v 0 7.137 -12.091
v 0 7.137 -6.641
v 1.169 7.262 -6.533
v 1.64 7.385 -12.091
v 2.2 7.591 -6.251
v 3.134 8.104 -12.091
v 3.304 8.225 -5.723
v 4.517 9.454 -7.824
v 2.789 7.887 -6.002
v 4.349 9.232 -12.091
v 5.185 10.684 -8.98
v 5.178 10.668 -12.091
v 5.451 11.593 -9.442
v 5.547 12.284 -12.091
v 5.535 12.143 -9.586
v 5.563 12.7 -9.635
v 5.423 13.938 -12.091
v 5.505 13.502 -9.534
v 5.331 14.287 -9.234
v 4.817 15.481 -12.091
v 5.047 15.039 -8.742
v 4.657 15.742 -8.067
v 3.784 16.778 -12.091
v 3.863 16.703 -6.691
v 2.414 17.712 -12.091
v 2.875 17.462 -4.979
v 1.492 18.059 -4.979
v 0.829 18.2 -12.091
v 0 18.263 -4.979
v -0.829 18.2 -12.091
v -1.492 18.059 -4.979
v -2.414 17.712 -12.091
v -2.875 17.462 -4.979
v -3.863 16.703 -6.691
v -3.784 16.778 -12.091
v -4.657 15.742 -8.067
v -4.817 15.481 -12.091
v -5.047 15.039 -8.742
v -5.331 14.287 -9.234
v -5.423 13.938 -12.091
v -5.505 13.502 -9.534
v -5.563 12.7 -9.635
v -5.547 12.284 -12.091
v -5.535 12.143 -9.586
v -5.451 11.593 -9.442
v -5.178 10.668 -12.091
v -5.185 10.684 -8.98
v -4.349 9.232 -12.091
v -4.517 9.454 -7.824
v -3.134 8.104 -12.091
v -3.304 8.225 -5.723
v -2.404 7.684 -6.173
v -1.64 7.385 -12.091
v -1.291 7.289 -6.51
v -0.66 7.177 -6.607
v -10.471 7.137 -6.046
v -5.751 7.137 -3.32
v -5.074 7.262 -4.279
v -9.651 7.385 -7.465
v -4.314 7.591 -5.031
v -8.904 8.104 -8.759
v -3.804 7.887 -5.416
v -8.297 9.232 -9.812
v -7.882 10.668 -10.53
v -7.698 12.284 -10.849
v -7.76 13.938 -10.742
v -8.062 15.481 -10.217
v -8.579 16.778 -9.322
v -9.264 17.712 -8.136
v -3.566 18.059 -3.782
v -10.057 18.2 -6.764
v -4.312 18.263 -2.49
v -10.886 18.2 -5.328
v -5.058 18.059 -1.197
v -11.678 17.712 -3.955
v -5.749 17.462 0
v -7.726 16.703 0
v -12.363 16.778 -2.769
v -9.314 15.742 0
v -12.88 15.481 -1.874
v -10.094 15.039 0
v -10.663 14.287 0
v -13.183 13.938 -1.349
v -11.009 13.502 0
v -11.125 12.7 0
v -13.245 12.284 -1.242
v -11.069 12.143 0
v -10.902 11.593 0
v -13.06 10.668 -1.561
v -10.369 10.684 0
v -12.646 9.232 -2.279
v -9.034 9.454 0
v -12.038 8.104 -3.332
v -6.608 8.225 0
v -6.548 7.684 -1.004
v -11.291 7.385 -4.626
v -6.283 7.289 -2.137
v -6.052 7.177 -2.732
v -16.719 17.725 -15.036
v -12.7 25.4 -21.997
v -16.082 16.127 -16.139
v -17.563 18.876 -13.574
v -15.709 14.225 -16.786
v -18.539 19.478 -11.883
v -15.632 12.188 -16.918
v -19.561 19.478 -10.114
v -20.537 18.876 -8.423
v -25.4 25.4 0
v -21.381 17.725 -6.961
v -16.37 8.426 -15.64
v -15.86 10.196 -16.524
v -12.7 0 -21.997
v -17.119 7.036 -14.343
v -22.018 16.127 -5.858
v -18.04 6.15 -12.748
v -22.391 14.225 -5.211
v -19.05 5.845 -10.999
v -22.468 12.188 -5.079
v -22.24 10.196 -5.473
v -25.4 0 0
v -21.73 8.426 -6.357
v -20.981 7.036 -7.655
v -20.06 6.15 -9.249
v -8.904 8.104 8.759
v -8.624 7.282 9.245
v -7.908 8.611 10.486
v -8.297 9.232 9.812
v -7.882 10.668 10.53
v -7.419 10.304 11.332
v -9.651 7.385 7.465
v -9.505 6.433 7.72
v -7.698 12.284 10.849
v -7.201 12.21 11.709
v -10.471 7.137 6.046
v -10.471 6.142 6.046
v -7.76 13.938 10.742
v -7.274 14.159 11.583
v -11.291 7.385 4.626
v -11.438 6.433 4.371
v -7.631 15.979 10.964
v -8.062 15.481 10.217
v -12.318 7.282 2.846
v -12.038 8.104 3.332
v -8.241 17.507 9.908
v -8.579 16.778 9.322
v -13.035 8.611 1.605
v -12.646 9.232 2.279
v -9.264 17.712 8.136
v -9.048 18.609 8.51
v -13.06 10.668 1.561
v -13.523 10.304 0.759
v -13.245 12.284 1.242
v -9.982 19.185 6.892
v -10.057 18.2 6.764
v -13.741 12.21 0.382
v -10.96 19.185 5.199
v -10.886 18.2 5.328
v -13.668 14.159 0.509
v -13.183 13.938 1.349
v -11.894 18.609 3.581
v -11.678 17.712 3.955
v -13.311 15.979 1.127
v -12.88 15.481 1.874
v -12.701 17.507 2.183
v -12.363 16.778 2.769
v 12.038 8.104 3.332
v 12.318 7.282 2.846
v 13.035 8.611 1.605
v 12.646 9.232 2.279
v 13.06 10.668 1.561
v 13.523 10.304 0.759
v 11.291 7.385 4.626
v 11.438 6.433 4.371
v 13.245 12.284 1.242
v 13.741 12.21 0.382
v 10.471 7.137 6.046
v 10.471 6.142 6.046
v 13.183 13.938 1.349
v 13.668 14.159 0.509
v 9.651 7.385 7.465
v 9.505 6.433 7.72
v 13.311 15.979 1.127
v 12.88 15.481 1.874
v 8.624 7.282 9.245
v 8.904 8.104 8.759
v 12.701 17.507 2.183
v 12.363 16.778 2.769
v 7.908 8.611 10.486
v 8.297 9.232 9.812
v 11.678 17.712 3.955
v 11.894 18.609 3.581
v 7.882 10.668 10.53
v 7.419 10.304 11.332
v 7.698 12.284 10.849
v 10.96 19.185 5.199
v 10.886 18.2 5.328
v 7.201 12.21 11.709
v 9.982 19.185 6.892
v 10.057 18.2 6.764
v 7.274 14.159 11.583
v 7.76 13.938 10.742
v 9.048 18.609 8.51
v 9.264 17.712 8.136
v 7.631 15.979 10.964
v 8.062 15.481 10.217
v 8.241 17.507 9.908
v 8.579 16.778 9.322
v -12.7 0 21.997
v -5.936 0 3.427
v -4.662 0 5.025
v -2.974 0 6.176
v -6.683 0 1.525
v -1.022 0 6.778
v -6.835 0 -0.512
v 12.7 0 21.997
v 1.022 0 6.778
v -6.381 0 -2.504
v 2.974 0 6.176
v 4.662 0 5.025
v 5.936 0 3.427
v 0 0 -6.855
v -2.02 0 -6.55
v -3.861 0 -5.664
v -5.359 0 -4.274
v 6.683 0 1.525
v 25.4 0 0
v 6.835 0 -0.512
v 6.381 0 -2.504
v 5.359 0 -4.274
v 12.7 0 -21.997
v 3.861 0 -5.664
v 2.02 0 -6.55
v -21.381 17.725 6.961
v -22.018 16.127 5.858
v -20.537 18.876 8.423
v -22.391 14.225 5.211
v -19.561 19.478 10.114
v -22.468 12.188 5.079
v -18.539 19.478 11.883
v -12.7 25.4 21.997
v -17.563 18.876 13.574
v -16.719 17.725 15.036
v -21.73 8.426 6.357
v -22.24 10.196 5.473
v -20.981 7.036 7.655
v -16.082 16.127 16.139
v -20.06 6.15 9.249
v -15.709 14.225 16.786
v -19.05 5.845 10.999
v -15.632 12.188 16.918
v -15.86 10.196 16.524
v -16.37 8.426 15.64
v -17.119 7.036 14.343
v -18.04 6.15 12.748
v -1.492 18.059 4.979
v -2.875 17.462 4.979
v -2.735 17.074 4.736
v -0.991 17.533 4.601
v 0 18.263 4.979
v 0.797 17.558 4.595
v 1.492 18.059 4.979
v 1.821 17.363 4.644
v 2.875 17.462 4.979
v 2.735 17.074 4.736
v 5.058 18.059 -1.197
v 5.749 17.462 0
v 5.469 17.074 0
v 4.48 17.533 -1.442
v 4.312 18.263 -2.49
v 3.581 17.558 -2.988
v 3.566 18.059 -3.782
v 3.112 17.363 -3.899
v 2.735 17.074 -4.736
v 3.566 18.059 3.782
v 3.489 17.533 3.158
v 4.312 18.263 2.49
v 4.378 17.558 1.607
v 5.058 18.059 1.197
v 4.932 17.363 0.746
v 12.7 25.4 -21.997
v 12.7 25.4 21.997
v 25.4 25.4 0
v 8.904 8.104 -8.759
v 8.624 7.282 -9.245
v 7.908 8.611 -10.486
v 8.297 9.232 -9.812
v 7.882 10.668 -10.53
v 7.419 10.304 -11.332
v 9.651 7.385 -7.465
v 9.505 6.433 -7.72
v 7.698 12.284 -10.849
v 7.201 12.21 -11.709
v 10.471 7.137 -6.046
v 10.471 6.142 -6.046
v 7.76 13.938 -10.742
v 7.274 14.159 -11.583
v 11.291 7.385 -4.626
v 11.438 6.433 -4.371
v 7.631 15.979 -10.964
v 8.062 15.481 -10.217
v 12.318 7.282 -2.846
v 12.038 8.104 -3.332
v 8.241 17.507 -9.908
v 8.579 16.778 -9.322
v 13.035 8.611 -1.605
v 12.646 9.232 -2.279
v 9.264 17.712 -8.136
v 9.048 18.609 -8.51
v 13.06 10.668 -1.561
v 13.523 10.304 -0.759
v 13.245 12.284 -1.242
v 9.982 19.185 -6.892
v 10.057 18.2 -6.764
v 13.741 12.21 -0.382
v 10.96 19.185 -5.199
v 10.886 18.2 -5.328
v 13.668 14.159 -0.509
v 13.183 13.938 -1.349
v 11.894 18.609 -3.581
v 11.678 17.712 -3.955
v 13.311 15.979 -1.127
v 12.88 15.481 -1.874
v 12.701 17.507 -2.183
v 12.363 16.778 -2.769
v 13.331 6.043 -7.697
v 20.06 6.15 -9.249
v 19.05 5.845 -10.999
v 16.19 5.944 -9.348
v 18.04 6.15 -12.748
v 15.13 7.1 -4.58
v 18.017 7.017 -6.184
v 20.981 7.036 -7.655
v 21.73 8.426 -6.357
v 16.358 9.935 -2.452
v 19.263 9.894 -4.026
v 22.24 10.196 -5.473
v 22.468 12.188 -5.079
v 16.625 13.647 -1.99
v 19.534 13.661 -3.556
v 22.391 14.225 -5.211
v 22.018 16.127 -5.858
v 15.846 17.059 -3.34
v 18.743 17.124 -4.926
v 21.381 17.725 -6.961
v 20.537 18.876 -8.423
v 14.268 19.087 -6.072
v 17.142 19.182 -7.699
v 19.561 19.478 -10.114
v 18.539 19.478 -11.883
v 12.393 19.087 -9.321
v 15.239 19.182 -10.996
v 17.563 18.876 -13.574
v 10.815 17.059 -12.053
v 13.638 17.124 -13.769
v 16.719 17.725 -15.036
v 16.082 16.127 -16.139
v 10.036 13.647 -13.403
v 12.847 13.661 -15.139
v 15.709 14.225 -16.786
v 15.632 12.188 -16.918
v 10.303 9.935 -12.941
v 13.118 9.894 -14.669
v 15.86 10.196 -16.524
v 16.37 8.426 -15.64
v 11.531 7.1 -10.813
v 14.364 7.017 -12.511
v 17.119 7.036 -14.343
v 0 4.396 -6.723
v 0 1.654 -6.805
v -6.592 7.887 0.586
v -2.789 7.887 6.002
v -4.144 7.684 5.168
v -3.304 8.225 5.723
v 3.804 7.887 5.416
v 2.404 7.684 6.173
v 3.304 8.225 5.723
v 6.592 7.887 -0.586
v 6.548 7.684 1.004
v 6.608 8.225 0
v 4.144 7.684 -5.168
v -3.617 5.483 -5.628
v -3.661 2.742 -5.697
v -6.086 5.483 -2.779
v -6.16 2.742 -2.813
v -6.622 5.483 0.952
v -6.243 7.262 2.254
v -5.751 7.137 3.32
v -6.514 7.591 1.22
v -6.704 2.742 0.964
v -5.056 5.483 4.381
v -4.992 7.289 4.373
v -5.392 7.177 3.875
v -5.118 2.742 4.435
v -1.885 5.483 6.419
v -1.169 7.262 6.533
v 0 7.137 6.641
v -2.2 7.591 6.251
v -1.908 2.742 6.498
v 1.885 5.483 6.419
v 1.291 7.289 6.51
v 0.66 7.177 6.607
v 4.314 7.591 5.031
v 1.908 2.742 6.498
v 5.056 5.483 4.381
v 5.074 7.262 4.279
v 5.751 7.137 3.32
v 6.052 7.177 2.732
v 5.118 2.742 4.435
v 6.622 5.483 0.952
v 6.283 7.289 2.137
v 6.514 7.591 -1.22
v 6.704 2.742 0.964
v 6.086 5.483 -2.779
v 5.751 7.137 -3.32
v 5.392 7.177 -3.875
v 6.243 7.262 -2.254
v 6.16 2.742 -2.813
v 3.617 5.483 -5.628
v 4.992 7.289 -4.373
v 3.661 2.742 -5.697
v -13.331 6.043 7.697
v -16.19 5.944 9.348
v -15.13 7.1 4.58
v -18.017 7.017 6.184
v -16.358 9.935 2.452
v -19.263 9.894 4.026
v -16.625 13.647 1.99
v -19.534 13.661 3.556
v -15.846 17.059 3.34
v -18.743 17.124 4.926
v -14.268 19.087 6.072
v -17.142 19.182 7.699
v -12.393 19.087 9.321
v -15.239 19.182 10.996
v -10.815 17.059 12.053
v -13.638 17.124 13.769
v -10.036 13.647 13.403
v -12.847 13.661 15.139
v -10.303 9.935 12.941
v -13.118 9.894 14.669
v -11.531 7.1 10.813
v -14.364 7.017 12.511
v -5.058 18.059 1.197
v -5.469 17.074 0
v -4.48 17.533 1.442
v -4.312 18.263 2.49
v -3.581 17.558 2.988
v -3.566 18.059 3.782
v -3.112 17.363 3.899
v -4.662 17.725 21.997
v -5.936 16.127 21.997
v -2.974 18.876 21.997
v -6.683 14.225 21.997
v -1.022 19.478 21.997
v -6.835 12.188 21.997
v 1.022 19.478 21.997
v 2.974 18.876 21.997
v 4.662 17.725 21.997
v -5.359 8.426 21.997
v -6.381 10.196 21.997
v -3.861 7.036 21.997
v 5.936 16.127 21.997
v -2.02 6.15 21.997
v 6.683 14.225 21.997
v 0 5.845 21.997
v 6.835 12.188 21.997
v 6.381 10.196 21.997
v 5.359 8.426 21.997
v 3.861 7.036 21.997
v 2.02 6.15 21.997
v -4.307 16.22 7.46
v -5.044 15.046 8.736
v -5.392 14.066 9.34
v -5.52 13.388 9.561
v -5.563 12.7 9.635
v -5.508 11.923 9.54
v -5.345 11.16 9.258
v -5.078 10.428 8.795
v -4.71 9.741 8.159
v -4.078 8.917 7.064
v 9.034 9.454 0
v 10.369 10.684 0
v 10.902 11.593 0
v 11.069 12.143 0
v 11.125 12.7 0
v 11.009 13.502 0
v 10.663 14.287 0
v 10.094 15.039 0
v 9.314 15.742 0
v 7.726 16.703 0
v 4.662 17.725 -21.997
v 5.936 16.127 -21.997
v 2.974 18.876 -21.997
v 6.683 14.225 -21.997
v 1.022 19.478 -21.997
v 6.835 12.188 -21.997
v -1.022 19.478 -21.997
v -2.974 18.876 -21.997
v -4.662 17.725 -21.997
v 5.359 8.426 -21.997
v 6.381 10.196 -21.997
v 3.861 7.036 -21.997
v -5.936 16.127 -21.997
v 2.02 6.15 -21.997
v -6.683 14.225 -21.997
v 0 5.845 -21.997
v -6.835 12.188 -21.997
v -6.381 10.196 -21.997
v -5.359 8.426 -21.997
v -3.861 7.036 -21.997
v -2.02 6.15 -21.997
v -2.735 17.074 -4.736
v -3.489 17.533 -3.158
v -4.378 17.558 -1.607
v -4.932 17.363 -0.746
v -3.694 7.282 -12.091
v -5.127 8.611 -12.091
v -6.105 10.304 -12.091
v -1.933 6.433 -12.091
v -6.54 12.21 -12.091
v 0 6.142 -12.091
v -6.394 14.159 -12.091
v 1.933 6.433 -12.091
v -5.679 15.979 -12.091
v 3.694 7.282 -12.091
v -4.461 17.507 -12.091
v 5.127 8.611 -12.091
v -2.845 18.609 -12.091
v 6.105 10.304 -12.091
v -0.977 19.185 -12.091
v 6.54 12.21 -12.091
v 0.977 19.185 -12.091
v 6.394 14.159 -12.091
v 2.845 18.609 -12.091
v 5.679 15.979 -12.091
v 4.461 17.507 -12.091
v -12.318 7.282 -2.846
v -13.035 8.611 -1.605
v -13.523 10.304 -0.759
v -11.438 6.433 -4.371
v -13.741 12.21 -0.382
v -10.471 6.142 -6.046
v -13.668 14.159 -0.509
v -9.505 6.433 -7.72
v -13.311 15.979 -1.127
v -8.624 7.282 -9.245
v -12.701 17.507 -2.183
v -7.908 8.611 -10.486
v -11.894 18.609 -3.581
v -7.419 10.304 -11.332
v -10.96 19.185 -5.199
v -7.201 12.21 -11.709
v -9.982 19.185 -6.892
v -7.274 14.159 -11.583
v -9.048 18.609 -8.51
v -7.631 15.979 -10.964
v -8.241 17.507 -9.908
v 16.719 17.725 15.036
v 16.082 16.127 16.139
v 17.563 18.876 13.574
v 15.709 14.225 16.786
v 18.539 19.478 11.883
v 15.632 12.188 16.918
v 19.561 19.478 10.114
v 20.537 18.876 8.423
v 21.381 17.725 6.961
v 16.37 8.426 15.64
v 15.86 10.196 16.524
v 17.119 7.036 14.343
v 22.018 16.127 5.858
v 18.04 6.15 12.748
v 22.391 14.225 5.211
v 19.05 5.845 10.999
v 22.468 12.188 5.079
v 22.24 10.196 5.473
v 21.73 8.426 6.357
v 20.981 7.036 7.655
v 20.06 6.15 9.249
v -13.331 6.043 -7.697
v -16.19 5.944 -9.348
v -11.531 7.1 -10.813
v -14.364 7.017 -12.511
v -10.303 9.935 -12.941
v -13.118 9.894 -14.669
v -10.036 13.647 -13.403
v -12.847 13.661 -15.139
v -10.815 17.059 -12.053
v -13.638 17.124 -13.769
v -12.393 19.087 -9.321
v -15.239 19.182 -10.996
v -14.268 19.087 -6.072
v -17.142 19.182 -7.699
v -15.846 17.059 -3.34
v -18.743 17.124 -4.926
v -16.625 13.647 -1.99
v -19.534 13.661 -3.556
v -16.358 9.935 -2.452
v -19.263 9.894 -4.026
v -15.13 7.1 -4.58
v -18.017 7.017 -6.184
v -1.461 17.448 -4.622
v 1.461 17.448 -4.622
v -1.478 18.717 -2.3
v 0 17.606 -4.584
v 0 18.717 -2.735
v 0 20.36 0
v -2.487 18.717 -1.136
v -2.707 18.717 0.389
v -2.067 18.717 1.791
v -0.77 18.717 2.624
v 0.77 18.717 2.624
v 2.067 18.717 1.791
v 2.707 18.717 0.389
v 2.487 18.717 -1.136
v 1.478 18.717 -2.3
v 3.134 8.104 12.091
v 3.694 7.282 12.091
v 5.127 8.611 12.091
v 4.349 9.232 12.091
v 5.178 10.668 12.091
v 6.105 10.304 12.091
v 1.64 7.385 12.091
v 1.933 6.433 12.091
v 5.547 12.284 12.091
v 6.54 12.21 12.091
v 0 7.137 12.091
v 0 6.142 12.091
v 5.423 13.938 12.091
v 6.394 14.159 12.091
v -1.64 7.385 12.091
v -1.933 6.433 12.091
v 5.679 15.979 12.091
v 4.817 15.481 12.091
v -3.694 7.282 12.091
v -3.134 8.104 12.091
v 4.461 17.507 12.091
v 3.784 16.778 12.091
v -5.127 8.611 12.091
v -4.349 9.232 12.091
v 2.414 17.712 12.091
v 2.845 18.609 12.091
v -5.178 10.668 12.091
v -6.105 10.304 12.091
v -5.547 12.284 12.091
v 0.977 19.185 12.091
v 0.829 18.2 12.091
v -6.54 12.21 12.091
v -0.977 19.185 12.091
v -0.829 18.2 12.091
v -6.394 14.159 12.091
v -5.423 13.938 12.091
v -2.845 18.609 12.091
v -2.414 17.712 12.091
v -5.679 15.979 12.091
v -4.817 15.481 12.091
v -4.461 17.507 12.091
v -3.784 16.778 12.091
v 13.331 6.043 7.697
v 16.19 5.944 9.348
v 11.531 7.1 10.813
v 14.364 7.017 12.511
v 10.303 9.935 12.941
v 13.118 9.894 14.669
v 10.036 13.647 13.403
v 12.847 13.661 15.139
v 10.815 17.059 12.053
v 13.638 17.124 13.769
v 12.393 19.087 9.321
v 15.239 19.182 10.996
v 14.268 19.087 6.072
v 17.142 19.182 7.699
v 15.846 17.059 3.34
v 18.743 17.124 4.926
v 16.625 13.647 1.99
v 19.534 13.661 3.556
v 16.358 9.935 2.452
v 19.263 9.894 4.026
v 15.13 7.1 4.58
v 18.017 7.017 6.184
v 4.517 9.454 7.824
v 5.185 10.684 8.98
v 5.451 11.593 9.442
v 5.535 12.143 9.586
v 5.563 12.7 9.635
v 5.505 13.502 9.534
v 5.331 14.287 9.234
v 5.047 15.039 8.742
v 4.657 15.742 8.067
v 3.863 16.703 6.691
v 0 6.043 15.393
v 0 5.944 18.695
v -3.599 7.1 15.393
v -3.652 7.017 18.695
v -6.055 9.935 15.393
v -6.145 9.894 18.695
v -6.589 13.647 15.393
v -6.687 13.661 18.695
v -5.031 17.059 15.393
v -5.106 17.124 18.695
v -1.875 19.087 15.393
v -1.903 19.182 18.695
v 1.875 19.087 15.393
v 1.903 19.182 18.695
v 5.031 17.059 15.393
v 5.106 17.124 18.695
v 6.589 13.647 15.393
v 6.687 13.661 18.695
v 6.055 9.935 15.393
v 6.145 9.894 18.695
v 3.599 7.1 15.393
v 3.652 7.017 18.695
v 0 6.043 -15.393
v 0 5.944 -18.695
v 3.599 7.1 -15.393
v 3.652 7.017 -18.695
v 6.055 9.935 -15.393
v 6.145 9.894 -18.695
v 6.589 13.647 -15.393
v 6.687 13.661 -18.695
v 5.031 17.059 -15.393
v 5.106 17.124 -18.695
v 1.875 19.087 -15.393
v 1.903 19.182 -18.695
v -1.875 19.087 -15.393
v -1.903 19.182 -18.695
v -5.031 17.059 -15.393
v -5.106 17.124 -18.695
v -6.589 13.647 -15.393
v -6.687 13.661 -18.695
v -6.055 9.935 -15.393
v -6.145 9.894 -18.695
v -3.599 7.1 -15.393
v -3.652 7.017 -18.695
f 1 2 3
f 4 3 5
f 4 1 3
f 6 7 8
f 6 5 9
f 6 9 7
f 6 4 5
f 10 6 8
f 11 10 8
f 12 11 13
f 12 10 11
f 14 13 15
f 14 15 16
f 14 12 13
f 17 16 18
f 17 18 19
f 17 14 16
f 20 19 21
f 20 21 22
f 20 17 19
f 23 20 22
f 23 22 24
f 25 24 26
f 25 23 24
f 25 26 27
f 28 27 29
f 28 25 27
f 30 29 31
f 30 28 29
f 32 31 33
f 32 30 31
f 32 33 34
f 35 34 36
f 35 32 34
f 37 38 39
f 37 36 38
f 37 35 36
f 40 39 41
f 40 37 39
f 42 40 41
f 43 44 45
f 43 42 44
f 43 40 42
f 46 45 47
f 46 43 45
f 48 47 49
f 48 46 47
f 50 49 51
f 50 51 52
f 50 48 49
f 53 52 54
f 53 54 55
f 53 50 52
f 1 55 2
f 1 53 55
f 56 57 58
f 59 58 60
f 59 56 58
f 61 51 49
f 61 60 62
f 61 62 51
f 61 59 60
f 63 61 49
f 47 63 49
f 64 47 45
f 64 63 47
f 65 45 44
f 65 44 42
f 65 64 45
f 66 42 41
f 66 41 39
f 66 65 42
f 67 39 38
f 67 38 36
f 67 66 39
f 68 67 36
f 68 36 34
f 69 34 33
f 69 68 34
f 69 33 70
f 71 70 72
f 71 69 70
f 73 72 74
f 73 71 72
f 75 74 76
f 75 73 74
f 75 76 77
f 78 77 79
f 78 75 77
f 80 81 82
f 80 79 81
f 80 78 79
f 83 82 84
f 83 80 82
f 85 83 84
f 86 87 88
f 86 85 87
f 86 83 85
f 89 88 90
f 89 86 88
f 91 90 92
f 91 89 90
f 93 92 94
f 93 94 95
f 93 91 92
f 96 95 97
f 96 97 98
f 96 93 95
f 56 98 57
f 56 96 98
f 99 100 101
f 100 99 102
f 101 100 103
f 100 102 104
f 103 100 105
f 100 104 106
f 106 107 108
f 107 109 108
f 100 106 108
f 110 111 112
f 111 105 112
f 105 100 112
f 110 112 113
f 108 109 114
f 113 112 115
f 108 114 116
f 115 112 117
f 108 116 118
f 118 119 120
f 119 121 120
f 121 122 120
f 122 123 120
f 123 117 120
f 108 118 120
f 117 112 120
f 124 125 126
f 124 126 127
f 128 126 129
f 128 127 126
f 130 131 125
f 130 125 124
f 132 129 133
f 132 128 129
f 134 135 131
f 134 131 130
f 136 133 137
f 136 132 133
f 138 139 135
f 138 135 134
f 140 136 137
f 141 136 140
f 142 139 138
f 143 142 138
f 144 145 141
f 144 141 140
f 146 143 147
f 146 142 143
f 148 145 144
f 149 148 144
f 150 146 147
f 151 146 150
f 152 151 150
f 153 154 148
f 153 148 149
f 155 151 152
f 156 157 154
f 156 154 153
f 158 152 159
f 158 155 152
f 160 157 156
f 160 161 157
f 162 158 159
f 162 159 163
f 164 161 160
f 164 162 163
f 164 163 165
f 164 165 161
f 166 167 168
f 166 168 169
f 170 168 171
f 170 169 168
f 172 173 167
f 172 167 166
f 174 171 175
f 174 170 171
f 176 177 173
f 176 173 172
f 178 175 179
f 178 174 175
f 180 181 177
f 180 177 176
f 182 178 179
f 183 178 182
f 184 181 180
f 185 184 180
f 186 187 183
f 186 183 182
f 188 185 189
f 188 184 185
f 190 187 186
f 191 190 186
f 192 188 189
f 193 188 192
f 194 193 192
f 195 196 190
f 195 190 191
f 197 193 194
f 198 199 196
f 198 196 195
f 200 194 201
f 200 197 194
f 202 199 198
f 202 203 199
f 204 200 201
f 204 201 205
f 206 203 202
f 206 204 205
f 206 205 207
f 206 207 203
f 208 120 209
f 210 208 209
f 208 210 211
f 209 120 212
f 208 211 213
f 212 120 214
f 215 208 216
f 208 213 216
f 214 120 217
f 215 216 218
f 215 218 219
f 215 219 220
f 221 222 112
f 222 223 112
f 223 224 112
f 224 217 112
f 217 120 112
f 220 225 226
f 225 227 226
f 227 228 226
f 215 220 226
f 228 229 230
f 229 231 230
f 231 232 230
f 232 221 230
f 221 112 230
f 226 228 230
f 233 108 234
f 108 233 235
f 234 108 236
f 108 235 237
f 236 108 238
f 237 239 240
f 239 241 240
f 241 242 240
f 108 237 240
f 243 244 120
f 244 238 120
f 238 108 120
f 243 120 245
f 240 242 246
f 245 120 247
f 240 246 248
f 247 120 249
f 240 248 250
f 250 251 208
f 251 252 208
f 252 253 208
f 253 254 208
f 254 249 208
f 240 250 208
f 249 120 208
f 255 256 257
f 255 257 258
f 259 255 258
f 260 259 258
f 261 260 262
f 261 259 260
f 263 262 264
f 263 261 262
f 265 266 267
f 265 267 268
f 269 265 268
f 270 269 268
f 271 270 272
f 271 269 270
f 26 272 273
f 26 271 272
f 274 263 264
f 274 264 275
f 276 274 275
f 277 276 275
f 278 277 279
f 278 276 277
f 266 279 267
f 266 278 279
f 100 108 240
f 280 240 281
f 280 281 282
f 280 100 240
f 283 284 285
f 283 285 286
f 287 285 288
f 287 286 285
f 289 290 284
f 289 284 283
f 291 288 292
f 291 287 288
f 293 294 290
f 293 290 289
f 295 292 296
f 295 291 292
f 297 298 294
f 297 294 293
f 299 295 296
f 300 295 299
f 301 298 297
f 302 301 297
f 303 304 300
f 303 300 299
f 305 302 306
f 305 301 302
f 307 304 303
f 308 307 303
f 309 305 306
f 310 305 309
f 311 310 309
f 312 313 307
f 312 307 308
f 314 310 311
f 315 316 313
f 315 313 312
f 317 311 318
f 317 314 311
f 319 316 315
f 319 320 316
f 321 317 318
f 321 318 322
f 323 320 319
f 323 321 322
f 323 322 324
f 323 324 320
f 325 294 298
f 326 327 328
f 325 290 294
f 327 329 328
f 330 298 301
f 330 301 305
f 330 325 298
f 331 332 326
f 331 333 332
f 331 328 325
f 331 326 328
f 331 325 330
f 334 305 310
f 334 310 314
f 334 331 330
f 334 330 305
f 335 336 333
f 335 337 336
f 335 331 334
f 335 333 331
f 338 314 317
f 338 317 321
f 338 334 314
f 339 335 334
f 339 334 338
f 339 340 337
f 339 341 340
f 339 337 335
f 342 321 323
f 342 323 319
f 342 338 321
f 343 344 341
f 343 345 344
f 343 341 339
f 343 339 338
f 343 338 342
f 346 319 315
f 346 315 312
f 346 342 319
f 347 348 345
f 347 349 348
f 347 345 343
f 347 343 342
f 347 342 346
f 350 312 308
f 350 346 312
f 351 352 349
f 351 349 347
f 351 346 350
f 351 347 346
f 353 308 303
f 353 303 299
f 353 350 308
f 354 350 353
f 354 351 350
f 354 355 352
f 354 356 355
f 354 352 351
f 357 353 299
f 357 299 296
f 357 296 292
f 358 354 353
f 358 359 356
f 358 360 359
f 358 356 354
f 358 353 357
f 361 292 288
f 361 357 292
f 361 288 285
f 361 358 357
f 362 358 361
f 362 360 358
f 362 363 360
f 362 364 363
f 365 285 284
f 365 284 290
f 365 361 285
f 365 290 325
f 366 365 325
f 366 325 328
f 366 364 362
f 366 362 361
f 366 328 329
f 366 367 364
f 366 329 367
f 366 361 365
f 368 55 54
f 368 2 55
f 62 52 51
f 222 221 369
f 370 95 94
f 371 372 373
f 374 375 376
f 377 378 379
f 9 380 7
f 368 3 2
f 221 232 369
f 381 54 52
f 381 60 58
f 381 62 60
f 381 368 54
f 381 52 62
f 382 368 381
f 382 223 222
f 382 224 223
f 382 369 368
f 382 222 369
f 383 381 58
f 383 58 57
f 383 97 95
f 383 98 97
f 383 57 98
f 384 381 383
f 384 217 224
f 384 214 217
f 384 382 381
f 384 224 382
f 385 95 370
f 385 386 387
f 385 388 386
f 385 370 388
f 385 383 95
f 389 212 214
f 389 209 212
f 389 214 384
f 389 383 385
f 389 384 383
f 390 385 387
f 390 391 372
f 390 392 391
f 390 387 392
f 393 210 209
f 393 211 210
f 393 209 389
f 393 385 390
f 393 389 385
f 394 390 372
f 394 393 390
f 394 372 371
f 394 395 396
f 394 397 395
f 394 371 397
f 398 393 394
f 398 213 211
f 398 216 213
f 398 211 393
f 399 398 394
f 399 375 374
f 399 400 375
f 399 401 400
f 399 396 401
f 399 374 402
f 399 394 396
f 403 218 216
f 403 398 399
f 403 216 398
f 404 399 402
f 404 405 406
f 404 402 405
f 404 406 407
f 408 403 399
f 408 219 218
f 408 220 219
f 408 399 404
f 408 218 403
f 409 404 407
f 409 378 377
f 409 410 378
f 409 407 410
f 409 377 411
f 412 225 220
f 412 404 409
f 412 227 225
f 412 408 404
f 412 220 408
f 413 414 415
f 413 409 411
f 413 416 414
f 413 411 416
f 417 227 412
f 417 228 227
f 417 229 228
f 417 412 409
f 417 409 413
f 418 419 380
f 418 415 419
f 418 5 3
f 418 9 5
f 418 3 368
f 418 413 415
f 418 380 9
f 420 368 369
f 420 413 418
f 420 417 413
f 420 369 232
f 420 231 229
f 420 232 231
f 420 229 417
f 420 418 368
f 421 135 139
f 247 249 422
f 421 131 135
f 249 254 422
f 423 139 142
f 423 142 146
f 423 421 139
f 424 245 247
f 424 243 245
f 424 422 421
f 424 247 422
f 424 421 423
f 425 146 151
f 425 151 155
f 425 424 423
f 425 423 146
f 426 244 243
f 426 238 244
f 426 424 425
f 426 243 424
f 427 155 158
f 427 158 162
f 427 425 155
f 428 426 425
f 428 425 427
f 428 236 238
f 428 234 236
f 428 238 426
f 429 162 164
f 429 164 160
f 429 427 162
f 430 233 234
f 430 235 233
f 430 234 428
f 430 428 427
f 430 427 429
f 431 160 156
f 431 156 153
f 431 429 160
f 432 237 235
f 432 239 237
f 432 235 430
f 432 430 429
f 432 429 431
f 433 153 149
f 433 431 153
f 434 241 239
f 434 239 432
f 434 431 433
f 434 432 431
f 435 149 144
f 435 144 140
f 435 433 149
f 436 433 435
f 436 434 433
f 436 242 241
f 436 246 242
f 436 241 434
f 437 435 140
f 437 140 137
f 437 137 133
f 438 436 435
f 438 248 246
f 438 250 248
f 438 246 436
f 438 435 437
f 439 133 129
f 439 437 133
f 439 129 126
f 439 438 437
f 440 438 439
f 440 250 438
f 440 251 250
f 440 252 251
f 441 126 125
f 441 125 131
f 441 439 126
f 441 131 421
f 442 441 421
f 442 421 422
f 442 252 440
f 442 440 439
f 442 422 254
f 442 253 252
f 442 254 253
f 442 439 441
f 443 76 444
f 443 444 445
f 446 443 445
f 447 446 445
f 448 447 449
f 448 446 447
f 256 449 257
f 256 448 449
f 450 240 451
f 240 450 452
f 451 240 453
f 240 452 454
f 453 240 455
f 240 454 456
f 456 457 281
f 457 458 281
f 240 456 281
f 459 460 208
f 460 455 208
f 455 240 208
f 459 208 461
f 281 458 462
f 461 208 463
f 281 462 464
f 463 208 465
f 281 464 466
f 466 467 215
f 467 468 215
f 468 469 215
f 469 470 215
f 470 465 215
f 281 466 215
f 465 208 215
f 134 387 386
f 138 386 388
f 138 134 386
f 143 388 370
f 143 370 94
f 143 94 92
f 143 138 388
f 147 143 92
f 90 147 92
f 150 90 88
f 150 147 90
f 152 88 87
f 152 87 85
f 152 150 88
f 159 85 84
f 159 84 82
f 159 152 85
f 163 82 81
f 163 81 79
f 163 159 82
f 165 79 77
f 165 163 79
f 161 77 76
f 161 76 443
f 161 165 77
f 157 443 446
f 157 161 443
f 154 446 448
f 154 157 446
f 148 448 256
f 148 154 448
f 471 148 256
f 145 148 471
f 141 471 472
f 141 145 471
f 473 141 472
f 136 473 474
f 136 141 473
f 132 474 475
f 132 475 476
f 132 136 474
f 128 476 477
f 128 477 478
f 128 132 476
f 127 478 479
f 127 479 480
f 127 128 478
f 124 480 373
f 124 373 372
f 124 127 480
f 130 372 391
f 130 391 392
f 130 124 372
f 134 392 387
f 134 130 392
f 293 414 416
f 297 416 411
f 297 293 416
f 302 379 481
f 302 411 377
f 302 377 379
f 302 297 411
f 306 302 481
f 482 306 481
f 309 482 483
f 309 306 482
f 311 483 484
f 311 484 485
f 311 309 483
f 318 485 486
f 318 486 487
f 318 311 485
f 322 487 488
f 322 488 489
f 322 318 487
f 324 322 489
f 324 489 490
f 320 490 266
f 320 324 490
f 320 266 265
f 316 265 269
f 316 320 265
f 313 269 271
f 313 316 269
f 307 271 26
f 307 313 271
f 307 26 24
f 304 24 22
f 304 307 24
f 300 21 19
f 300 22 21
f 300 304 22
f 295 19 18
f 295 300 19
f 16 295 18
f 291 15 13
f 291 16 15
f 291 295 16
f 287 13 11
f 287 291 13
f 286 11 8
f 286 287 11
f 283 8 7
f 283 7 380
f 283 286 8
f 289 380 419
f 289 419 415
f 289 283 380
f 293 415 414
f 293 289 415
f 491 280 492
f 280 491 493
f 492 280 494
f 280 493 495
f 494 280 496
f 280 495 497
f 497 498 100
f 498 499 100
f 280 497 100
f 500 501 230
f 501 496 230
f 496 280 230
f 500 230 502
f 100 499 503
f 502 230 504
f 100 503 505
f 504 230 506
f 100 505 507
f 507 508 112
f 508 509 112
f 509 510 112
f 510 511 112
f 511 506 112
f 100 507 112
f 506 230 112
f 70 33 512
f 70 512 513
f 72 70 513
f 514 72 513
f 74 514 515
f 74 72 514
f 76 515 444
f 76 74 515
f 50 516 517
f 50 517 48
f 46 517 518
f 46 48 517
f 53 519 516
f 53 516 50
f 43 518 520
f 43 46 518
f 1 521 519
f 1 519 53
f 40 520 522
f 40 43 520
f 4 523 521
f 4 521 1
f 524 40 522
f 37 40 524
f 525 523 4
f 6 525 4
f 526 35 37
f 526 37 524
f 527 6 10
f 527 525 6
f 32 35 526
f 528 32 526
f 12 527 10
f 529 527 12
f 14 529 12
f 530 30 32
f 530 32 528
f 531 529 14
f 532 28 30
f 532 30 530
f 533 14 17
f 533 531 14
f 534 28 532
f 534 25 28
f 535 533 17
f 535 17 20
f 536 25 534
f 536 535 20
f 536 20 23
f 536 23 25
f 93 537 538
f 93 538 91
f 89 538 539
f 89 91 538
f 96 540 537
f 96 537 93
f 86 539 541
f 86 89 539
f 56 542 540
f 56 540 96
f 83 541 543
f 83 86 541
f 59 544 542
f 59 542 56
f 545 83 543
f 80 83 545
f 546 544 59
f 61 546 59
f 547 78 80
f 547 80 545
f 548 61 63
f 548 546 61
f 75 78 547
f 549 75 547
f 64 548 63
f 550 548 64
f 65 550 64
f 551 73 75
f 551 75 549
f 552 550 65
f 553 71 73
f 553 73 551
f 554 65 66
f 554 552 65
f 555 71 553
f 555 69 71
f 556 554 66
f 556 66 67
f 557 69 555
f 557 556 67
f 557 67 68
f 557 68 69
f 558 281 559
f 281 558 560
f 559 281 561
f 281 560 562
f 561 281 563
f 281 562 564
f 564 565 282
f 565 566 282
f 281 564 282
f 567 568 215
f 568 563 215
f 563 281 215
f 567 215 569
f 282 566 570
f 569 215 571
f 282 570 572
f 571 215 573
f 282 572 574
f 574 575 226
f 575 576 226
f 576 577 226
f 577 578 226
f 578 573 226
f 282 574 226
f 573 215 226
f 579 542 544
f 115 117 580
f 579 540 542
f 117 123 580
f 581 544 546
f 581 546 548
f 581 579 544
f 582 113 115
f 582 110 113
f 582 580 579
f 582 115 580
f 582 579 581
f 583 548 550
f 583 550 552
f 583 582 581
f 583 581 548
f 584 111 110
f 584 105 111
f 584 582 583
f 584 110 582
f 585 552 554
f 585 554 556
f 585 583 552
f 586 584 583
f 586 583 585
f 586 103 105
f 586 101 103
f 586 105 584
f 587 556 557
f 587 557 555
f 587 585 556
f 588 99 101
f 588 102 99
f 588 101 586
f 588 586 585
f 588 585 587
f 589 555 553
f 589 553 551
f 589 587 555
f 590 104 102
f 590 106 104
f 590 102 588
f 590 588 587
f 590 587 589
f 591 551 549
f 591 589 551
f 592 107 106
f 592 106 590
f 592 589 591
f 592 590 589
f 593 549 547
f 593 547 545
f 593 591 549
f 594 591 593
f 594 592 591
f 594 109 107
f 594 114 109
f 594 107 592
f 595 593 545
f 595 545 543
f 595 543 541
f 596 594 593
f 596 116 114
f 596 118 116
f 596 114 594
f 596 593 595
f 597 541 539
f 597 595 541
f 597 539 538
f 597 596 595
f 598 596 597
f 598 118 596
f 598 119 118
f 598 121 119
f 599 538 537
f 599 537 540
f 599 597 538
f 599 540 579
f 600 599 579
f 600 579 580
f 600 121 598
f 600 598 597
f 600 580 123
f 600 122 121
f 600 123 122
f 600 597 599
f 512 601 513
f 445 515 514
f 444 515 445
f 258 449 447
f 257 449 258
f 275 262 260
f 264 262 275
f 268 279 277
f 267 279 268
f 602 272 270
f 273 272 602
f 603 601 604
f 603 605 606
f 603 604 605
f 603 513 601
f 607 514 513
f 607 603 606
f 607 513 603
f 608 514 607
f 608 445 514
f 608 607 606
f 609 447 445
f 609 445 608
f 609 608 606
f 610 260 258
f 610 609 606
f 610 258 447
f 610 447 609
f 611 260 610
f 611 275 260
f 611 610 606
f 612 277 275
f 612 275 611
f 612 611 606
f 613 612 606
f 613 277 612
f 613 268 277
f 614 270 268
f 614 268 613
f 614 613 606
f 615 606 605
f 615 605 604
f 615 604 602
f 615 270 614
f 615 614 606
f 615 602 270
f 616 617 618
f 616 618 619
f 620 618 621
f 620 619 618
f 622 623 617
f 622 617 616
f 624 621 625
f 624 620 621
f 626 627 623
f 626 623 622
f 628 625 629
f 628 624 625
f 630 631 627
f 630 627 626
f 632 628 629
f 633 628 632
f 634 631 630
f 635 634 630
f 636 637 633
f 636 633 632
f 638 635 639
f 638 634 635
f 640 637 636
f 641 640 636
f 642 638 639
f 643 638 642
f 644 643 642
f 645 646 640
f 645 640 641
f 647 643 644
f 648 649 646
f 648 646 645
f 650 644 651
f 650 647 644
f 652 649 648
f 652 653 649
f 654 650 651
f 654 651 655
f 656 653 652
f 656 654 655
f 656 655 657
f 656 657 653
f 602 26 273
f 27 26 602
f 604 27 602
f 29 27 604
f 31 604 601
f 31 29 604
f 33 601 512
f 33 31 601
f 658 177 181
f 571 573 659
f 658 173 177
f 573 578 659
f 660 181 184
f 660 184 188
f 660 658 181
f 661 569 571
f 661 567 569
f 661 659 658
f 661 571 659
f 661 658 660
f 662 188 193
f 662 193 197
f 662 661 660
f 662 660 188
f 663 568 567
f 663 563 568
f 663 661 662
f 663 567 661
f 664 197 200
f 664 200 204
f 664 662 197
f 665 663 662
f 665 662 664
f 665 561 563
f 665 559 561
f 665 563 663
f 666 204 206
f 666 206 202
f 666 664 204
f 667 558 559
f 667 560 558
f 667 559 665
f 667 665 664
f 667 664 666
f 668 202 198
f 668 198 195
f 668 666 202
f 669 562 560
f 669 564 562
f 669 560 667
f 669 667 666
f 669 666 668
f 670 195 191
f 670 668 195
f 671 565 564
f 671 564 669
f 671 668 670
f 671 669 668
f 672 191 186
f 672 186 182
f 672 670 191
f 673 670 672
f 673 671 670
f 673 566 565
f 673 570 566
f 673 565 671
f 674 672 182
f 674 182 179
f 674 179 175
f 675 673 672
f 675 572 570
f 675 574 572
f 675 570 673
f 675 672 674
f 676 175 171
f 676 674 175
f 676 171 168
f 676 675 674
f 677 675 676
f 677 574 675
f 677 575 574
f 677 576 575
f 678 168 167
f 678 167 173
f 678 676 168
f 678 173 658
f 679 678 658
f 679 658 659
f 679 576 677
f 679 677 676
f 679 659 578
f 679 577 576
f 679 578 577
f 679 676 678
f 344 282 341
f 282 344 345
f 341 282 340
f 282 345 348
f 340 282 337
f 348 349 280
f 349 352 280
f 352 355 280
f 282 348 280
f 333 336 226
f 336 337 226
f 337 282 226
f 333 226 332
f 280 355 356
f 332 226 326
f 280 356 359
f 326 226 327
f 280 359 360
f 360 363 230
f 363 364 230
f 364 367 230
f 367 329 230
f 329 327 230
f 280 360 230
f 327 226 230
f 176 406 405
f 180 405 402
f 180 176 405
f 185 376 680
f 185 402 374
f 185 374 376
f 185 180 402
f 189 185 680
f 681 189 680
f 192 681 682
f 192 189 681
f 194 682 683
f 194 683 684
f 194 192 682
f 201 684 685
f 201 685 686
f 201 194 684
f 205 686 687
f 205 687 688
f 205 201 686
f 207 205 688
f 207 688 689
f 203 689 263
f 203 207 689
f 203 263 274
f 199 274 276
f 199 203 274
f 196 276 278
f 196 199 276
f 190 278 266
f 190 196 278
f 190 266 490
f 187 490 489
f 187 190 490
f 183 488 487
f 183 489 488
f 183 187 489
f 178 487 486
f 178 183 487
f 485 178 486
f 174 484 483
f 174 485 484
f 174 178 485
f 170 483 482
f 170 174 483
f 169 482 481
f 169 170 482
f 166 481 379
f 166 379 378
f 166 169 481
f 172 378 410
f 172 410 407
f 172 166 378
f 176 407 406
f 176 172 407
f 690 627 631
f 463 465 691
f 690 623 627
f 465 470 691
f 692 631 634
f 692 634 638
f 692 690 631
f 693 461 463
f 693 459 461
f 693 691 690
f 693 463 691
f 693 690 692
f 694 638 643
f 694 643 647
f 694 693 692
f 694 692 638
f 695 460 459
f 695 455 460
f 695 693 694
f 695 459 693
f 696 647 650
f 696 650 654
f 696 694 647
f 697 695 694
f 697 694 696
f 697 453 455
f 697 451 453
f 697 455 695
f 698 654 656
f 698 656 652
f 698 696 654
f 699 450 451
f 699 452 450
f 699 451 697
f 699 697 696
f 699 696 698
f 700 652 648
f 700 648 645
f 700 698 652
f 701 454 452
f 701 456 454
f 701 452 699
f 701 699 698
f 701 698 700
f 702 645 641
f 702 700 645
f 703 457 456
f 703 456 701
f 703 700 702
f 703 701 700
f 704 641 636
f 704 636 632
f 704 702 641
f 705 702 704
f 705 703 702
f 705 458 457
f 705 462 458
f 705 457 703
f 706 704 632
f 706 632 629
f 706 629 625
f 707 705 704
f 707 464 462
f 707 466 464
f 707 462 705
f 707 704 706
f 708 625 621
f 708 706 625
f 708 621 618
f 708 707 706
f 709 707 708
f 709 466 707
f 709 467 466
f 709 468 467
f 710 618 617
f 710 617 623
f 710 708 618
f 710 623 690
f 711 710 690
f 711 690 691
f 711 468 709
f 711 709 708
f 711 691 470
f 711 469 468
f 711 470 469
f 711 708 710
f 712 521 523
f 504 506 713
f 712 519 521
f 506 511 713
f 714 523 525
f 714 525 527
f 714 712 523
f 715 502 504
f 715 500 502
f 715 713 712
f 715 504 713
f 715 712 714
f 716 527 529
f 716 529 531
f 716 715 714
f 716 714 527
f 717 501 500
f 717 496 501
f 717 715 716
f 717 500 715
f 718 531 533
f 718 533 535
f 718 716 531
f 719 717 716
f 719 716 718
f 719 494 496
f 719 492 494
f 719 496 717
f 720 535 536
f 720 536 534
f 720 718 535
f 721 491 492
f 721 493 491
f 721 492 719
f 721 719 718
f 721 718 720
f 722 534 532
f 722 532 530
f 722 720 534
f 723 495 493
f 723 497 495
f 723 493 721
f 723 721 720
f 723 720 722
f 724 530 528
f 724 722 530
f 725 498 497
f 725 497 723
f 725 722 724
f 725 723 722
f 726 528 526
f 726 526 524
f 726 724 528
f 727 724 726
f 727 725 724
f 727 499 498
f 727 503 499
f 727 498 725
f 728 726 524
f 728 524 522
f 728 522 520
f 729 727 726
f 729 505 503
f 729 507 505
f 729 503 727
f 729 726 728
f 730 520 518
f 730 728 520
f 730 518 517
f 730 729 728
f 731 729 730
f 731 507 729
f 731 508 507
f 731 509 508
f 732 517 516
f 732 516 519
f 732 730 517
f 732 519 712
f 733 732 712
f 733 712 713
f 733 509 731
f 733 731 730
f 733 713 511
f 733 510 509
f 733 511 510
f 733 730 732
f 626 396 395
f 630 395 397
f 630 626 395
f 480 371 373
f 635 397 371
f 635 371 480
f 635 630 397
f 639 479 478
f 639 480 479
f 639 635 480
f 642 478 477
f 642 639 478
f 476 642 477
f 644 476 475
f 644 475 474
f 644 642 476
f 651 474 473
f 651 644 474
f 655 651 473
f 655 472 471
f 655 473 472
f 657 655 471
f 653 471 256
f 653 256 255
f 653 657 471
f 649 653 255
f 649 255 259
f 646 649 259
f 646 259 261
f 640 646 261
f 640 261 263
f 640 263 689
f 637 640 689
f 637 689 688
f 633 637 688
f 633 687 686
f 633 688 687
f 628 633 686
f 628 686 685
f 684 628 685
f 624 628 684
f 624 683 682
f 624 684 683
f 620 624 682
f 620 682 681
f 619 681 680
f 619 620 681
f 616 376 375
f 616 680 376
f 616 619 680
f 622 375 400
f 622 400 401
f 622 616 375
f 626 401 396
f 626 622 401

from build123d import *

# Parameters (mm, degrees)
BOSS_EXTRUDE1_DEPTH = 25.4
CIRPATTERN1_COUNT   = 6


with BuildPart() as part:
    # Sketch1 → Boss-Extrude1 (new body)
    with BuildSketch(Plane(origin=(0, 0, 0), x_dir=(1, 0, 0), z_dir=(0, 1, 0))):
        Polygon((25.4, 0), (12.7, 21.997045256), (-12.7, 21.997045256), (-25.4, 0), (-12.7, -21.997045256), (12.7, -21.997045256), align=None)
    extrude(amount=BOSS_EXTRUDE1_DEPTH)

    # Sketch2 → 1/4 NPT Tapped Hole1 (revolve, cut)
    with BuildSketch(Plane(origin=(0, 0, 0), x_dir=(0, 0, -1), z_dir=(1, 0, 0))):
        Polygon((0, 0), (0, 20.360347279), (5.5626, 17.018), (5.5626, 9.906), (6.557984794, 9.906), (6.8545837, 0), align=None)
    revolve(axis=Axis((0, -6.35, 0), (0, 1, 0)), mode=Mode.SUBTRACT)

    # Sketch4 → 1/4 NPT Tapped Hole2 (revolve, cut)
    with BuildSketch(Plane(origin=(0, 12.7, 21.997045256), x_dir=(0, -1, 0), z_dir=(1, 0, 0))):
        Polygon((0, 0), (0, 20.360347279), (5.5626, 17.018), (5.5626, 9.906), (6.557984794, 9.906), (6.8545837, 0), align=None)
    f_1_4_npt_tapped_hole2 = revolve(axis=Axis((0, 12.7, 28.347045256), (0, 0, -1)), mode=Mode.SUBTRACT)

    # CirPattern1: 1/4 NPT Tapped Hole2 ×6 about axis
    cirpattern1_axis = Axis((0, 0, 0), (0, 1, 0))
    for i in range(1, CIRPATTERN1_COUNT):
        add(f_1_4_npt_tapped_hole2.rotate(cirpattern1_axis, i * 360 / CIRPATTERN1_COUNT), mode=Mode.SUBTRACT)


solid = part.part
